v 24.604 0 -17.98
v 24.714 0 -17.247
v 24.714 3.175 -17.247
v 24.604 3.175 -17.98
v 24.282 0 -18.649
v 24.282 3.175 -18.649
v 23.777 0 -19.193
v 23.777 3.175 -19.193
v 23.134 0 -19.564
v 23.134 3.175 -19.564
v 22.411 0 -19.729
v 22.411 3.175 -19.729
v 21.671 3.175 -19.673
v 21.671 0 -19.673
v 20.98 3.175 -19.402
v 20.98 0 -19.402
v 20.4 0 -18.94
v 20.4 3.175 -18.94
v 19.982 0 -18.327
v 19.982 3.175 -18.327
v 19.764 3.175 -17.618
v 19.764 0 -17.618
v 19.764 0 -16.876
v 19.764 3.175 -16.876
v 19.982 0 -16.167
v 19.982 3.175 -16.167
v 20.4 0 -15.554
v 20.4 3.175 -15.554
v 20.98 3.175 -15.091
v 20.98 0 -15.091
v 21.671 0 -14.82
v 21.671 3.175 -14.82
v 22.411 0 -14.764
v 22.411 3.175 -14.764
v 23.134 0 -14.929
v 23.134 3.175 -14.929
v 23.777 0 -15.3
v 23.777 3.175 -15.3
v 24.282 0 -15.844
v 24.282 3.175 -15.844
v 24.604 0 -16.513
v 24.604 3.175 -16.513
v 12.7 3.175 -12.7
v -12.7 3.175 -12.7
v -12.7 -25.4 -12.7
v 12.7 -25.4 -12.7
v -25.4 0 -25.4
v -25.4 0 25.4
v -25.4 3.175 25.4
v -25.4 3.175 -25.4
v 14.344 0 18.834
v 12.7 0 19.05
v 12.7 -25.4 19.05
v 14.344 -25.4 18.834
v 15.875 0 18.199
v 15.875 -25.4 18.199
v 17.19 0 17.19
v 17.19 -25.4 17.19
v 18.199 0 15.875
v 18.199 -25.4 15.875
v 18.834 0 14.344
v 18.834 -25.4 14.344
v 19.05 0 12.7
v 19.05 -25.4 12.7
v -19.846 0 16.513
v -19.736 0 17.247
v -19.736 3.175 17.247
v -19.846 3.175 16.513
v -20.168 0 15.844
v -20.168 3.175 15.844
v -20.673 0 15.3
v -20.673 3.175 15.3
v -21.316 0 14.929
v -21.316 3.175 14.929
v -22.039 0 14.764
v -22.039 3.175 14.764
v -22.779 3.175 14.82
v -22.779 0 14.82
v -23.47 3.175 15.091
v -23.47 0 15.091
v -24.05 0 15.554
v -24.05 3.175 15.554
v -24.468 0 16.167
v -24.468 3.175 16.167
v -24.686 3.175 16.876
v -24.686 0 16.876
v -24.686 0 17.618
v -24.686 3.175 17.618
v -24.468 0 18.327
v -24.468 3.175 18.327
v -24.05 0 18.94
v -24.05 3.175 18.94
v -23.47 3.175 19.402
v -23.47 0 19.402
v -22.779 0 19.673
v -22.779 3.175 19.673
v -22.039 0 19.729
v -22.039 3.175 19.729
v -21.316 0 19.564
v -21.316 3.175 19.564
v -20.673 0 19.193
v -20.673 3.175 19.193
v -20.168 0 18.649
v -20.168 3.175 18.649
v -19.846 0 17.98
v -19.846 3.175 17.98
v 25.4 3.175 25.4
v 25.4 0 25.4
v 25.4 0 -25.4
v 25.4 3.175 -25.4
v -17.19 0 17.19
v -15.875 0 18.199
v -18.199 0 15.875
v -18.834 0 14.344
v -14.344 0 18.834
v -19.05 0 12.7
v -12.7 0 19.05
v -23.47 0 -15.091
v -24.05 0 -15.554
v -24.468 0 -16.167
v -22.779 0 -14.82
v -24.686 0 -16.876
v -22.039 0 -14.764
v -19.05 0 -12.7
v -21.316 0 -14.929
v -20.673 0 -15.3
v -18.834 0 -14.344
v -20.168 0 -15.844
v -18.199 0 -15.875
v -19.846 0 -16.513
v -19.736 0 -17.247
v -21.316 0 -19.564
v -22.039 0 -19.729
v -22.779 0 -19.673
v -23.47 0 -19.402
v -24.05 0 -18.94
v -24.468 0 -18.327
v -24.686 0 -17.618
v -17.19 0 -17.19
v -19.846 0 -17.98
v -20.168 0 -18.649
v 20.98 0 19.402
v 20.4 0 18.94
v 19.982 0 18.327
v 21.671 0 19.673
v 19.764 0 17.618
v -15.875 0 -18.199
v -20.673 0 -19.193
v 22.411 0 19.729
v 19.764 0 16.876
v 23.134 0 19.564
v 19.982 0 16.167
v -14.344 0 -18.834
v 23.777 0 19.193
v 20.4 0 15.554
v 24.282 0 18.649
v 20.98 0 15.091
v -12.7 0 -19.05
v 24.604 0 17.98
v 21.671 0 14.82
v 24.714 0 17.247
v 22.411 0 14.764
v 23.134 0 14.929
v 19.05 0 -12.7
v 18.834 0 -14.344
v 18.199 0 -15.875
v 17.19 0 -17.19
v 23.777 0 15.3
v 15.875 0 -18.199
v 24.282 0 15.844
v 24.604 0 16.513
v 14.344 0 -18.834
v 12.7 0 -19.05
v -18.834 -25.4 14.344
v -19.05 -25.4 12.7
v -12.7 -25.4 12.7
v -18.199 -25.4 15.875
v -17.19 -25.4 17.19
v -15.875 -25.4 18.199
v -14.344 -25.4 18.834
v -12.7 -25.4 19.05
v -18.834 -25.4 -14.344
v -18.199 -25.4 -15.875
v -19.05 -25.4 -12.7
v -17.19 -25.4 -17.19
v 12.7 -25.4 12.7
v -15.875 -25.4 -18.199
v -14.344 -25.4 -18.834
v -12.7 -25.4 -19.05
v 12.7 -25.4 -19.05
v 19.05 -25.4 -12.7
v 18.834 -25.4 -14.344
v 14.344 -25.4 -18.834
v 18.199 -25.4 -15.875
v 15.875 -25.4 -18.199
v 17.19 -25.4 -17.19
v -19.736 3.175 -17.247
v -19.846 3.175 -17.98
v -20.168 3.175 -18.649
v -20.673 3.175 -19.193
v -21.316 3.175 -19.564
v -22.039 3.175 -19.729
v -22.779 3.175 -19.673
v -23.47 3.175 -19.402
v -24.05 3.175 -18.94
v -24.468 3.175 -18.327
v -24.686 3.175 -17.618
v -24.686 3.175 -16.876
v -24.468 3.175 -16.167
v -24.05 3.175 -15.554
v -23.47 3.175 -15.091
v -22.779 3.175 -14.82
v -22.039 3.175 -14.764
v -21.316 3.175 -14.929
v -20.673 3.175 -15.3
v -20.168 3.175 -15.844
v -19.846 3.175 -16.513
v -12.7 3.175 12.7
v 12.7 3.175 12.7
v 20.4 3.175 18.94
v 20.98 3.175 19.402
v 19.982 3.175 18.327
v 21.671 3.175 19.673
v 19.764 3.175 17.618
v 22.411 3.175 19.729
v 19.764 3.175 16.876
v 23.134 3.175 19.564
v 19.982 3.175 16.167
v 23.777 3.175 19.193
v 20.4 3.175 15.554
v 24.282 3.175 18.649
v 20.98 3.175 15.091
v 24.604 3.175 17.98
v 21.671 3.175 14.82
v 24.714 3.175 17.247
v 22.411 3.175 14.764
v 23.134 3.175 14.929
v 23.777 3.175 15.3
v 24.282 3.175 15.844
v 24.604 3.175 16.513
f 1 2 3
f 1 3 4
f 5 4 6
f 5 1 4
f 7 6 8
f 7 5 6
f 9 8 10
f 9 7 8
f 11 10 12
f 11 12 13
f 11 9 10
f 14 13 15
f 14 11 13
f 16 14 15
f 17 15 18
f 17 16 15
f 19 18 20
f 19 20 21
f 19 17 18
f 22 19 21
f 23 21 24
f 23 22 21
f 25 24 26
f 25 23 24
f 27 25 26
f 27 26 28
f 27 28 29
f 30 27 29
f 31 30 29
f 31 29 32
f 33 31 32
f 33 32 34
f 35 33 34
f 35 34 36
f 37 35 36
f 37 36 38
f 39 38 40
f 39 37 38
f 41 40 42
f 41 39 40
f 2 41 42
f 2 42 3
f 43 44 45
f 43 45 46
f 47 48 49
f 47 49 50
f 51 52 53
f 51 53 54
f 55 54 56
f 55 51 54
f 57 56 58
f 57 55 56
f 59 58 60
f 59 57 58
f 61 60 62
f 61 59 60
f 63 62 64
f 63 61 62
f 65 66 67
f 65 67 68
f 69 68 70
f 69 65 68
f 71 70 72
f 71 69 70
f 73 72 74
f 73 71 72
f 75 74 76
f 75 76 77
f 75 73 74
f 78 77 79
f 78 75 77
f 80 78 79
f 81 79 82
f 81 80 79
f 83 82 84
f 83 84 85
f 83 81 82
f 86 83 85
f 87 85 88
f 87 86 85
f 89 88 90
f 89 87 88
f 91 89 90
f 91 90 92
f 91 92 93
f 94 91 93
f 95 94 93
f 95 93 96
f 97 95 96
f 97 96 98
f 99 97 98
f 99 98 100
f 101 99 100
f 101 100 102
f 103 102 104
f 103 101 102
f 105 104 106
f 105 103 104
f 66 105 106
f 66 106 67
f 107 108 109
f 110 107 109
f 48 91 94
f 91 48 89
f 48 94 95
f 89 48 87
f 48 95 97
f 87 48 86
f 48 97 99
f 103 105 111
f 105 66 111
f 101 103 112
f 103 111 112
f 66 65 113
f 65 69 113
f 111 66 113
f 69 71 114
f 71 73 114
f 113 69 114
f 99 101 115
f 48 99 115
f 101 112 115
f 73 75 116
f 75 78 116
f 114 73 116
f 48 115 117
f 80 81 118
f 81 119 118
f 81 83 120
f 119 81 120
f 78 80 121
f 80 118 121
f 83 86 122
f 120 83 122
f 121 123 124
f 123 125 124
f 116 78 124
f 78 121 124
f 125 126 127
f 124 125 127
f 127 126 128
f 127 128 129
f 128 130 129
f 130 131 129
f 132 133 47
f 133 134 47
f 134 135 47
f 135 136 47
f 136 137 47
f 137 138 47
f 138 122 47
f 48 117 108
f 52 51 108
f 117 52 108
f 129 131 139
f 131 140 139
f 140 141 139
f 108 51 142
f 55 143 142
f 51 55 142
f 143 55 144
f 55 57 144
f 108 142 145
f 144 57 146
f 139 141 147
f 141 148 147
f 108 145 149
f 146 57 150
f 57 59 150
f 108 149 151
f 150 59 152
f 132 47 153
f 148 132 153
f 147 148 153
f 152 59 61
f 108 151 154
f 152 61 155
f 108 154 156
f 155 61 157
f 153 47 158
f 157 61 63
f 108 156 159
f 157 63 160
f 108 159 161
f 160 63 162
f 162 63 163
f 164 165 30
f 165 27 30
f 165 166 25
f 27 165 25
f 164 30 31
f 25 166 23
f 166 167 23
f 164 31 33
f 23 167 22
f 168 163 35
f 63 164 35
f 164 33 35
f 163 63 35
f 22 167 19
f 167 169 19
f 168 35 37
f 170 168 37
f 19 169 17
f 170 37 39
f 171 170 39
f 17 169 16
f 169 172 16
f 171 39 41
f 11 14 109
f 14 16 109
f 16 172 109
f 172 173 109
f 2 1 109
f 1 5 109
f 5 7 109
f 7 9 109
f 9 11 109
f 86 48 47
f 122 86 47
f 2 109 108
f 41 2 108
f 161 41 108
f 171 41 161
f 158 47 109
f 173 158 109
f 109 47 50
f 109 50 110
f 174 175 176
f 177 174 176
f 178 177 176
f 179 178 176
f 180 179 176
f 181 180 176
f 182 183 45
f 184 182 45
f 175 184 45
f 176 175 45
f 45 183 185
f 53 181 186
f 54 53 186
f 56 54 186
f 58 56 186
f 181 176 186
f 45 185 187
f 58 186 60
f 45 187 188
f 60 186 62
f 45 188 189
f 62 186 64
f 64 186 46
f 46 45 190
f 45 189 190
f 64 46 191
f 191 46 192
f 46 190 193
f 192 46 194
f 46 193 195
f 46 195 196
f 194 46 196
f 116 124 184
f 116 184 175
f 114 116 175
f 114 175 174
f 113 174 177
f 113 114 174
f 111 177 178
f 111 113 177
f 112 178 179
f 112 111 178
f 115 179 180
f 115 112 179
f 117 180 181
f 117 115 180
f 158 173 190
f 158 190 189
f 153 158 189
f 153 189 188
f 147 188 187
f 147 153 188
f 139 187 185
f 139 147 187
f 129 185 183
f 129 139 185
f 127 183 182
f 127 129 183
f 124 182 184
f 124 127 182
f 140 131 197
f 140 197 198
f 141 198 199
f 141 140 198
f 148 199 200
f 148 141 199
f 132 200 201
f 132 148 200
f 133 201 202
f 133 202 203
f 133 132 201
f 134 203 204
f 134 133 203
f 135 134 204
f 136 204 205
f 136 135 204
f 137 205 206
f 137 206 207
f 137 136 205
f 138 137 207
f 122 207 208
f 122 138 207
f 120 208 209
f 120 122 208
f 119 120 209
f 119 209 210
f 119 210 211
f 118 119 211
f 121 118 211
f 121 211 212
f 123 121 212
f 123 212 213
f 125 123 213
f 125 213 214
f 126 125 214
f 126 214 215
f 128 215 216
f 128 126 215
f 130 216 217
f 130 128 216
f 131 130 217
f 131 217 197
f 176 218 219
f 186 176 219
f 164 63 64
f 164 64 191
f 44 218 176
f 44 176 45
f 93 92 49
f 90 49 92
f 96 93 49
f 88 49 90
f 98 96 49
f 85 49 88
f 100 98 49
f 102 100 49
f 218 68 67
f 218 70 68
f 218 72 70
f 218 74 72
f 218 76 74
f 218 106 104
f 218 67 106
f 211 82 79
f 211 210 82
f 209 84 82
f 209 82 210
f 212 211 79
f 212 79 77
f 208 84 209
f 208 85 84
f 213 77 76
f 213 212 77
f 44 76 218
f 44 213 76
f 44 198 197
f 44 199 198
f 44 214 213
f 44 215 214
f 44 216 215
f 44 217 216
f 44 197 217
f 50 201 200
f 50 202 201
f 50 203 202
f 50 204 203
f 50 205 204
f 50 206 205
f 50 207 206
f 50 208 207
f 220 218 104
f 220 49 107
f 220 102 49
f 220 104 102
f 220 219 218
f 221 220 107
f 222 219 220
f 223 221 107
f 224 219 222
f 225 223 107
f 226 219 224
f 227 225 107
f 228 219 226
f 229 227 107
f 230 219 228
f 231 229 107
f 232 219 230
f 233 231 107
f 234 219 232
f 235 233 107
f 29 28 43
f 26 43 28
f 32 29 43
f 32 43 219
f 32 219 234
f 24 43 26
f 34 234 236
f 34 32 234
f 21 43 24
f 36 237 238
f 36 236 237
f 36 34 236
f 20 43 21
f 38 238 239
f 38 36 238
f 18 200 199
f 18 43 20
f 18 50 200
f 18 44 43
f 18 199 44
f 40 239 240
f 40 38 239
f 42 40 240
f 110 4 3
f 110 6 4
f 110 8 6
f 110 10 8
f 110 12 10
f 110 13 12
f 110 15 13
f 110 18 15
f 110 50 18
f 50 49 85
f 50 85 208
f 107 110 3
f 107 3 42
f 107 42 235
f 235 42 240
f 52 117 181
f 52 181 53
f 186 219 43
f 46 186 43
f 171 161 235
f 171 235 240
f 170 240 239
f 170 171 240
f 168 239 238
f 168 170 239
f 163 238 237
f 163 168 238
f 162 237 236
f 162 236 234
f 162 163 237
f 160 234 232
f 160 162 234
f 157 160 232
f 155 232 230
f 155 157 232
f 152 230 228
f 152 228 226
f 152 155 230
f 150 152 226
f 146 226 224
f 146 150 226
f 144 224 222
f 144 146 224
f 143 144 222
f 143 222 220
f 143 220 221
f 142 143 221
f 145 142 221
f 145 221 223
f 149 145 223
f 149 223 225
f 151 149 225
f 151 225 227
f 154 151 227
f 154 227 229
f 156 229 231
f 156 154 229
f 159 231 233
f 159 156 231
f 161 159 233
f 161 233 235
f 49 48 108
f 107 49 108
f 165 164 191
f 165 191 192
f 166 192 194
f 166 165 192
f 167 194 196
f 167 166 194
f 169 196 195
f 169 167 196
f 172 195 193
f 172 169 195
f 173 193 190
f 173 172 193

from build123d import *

# Parameters (mm, degrees)
SKETCH1_W           = 50.8
SKETCH1_H           = 50.8
SKETCH1_R           = 2.4892
BOSS_EXTRUDE1_DEPTH = 3.175
BOSS_EXTRUDE2_DEPTH = 25.4
SKETCH2_W           = 25.4
SKETCH2_H           = 25.4
CUT_EXTRUDE1_DEPTH  = 29.575


with BuildPart() as part:
    # Sketch1 → Boss-Extrude1 (new body)
    with BuildSketch(Plane(origin=(0, 0, 0), x_dir=(1, 0, 0), z_dir=(0, 1, 0))):
        Rectangle(SKETCH1_W, SKETCH1_H)
        with Locations((-22.225, 17.2466)):
            Circle(SKETCH1_R, mode=Mode.SUBTRACT)
        with Locations((22.225, 17.2466)):
            Circle(SKETCH1_R, mode=Mode.SUBTRACT)
        with Locations((22.225, -17.2466)):
            Circle(SKETCH1_R, mode=Mode.SUBTRACT)
        with Locations((-22.225, -17.2466)):
            Circle(SKETCH1_R, mode=Mode.SUBTRACT)
    extrude(amount=BOSS_EXTRUDE1_DEPTH)

    # Sketch1<3> → Boss-Extrude2 (add)
    with BuildSketch(Plane(origin=(0, 0, 0), x_dir=(1, 0, 0), z_dir=(0, 1, 0))):
        with BuildLine():
            ThreePointArc((-19.05, -12.7), (-17.190128061, -17.190128061), (-12.7, -19.05))
            Line((-12.7, -19.05), (12.7, -19.05))
            ThreePointArc((12.7, -19.05), (17.190128061, -17.190128061), (19.05, -12.7))
            Line((19.05, -12.7), (19.05, 12.7))
            ThreePointArc((19.05, 12.7), (17.190128061, 17.190128061), (12.7, 19.05))
            Line((12.7, 19.05), (-12.7, 19.05))
            ThreePointArc((-12.7, 19.05), (-17.190128061, 17.190128061), (-19.05, 12.7))
            Line((-19.05, 12.7), (-19.05, -12.7))
        make_face()
    extrude(amount=-BOSS_EXTRUDE2_DEPTH)

    # Sketch2 → Cut-Extrude1 (cut, through all)
    with BuildSketch(Plane(origin=(0, 3.175, 0), x_dir=(1, 0, 0), z_dir=(0, 1, 0))):
        Rectangle(SKETCH2_W, SKETCH2_H)
    extrude(amount=-CUT_EXTRUDE1_DEPTH, mode=Mode.SUBTRACT)


solid = part.part
